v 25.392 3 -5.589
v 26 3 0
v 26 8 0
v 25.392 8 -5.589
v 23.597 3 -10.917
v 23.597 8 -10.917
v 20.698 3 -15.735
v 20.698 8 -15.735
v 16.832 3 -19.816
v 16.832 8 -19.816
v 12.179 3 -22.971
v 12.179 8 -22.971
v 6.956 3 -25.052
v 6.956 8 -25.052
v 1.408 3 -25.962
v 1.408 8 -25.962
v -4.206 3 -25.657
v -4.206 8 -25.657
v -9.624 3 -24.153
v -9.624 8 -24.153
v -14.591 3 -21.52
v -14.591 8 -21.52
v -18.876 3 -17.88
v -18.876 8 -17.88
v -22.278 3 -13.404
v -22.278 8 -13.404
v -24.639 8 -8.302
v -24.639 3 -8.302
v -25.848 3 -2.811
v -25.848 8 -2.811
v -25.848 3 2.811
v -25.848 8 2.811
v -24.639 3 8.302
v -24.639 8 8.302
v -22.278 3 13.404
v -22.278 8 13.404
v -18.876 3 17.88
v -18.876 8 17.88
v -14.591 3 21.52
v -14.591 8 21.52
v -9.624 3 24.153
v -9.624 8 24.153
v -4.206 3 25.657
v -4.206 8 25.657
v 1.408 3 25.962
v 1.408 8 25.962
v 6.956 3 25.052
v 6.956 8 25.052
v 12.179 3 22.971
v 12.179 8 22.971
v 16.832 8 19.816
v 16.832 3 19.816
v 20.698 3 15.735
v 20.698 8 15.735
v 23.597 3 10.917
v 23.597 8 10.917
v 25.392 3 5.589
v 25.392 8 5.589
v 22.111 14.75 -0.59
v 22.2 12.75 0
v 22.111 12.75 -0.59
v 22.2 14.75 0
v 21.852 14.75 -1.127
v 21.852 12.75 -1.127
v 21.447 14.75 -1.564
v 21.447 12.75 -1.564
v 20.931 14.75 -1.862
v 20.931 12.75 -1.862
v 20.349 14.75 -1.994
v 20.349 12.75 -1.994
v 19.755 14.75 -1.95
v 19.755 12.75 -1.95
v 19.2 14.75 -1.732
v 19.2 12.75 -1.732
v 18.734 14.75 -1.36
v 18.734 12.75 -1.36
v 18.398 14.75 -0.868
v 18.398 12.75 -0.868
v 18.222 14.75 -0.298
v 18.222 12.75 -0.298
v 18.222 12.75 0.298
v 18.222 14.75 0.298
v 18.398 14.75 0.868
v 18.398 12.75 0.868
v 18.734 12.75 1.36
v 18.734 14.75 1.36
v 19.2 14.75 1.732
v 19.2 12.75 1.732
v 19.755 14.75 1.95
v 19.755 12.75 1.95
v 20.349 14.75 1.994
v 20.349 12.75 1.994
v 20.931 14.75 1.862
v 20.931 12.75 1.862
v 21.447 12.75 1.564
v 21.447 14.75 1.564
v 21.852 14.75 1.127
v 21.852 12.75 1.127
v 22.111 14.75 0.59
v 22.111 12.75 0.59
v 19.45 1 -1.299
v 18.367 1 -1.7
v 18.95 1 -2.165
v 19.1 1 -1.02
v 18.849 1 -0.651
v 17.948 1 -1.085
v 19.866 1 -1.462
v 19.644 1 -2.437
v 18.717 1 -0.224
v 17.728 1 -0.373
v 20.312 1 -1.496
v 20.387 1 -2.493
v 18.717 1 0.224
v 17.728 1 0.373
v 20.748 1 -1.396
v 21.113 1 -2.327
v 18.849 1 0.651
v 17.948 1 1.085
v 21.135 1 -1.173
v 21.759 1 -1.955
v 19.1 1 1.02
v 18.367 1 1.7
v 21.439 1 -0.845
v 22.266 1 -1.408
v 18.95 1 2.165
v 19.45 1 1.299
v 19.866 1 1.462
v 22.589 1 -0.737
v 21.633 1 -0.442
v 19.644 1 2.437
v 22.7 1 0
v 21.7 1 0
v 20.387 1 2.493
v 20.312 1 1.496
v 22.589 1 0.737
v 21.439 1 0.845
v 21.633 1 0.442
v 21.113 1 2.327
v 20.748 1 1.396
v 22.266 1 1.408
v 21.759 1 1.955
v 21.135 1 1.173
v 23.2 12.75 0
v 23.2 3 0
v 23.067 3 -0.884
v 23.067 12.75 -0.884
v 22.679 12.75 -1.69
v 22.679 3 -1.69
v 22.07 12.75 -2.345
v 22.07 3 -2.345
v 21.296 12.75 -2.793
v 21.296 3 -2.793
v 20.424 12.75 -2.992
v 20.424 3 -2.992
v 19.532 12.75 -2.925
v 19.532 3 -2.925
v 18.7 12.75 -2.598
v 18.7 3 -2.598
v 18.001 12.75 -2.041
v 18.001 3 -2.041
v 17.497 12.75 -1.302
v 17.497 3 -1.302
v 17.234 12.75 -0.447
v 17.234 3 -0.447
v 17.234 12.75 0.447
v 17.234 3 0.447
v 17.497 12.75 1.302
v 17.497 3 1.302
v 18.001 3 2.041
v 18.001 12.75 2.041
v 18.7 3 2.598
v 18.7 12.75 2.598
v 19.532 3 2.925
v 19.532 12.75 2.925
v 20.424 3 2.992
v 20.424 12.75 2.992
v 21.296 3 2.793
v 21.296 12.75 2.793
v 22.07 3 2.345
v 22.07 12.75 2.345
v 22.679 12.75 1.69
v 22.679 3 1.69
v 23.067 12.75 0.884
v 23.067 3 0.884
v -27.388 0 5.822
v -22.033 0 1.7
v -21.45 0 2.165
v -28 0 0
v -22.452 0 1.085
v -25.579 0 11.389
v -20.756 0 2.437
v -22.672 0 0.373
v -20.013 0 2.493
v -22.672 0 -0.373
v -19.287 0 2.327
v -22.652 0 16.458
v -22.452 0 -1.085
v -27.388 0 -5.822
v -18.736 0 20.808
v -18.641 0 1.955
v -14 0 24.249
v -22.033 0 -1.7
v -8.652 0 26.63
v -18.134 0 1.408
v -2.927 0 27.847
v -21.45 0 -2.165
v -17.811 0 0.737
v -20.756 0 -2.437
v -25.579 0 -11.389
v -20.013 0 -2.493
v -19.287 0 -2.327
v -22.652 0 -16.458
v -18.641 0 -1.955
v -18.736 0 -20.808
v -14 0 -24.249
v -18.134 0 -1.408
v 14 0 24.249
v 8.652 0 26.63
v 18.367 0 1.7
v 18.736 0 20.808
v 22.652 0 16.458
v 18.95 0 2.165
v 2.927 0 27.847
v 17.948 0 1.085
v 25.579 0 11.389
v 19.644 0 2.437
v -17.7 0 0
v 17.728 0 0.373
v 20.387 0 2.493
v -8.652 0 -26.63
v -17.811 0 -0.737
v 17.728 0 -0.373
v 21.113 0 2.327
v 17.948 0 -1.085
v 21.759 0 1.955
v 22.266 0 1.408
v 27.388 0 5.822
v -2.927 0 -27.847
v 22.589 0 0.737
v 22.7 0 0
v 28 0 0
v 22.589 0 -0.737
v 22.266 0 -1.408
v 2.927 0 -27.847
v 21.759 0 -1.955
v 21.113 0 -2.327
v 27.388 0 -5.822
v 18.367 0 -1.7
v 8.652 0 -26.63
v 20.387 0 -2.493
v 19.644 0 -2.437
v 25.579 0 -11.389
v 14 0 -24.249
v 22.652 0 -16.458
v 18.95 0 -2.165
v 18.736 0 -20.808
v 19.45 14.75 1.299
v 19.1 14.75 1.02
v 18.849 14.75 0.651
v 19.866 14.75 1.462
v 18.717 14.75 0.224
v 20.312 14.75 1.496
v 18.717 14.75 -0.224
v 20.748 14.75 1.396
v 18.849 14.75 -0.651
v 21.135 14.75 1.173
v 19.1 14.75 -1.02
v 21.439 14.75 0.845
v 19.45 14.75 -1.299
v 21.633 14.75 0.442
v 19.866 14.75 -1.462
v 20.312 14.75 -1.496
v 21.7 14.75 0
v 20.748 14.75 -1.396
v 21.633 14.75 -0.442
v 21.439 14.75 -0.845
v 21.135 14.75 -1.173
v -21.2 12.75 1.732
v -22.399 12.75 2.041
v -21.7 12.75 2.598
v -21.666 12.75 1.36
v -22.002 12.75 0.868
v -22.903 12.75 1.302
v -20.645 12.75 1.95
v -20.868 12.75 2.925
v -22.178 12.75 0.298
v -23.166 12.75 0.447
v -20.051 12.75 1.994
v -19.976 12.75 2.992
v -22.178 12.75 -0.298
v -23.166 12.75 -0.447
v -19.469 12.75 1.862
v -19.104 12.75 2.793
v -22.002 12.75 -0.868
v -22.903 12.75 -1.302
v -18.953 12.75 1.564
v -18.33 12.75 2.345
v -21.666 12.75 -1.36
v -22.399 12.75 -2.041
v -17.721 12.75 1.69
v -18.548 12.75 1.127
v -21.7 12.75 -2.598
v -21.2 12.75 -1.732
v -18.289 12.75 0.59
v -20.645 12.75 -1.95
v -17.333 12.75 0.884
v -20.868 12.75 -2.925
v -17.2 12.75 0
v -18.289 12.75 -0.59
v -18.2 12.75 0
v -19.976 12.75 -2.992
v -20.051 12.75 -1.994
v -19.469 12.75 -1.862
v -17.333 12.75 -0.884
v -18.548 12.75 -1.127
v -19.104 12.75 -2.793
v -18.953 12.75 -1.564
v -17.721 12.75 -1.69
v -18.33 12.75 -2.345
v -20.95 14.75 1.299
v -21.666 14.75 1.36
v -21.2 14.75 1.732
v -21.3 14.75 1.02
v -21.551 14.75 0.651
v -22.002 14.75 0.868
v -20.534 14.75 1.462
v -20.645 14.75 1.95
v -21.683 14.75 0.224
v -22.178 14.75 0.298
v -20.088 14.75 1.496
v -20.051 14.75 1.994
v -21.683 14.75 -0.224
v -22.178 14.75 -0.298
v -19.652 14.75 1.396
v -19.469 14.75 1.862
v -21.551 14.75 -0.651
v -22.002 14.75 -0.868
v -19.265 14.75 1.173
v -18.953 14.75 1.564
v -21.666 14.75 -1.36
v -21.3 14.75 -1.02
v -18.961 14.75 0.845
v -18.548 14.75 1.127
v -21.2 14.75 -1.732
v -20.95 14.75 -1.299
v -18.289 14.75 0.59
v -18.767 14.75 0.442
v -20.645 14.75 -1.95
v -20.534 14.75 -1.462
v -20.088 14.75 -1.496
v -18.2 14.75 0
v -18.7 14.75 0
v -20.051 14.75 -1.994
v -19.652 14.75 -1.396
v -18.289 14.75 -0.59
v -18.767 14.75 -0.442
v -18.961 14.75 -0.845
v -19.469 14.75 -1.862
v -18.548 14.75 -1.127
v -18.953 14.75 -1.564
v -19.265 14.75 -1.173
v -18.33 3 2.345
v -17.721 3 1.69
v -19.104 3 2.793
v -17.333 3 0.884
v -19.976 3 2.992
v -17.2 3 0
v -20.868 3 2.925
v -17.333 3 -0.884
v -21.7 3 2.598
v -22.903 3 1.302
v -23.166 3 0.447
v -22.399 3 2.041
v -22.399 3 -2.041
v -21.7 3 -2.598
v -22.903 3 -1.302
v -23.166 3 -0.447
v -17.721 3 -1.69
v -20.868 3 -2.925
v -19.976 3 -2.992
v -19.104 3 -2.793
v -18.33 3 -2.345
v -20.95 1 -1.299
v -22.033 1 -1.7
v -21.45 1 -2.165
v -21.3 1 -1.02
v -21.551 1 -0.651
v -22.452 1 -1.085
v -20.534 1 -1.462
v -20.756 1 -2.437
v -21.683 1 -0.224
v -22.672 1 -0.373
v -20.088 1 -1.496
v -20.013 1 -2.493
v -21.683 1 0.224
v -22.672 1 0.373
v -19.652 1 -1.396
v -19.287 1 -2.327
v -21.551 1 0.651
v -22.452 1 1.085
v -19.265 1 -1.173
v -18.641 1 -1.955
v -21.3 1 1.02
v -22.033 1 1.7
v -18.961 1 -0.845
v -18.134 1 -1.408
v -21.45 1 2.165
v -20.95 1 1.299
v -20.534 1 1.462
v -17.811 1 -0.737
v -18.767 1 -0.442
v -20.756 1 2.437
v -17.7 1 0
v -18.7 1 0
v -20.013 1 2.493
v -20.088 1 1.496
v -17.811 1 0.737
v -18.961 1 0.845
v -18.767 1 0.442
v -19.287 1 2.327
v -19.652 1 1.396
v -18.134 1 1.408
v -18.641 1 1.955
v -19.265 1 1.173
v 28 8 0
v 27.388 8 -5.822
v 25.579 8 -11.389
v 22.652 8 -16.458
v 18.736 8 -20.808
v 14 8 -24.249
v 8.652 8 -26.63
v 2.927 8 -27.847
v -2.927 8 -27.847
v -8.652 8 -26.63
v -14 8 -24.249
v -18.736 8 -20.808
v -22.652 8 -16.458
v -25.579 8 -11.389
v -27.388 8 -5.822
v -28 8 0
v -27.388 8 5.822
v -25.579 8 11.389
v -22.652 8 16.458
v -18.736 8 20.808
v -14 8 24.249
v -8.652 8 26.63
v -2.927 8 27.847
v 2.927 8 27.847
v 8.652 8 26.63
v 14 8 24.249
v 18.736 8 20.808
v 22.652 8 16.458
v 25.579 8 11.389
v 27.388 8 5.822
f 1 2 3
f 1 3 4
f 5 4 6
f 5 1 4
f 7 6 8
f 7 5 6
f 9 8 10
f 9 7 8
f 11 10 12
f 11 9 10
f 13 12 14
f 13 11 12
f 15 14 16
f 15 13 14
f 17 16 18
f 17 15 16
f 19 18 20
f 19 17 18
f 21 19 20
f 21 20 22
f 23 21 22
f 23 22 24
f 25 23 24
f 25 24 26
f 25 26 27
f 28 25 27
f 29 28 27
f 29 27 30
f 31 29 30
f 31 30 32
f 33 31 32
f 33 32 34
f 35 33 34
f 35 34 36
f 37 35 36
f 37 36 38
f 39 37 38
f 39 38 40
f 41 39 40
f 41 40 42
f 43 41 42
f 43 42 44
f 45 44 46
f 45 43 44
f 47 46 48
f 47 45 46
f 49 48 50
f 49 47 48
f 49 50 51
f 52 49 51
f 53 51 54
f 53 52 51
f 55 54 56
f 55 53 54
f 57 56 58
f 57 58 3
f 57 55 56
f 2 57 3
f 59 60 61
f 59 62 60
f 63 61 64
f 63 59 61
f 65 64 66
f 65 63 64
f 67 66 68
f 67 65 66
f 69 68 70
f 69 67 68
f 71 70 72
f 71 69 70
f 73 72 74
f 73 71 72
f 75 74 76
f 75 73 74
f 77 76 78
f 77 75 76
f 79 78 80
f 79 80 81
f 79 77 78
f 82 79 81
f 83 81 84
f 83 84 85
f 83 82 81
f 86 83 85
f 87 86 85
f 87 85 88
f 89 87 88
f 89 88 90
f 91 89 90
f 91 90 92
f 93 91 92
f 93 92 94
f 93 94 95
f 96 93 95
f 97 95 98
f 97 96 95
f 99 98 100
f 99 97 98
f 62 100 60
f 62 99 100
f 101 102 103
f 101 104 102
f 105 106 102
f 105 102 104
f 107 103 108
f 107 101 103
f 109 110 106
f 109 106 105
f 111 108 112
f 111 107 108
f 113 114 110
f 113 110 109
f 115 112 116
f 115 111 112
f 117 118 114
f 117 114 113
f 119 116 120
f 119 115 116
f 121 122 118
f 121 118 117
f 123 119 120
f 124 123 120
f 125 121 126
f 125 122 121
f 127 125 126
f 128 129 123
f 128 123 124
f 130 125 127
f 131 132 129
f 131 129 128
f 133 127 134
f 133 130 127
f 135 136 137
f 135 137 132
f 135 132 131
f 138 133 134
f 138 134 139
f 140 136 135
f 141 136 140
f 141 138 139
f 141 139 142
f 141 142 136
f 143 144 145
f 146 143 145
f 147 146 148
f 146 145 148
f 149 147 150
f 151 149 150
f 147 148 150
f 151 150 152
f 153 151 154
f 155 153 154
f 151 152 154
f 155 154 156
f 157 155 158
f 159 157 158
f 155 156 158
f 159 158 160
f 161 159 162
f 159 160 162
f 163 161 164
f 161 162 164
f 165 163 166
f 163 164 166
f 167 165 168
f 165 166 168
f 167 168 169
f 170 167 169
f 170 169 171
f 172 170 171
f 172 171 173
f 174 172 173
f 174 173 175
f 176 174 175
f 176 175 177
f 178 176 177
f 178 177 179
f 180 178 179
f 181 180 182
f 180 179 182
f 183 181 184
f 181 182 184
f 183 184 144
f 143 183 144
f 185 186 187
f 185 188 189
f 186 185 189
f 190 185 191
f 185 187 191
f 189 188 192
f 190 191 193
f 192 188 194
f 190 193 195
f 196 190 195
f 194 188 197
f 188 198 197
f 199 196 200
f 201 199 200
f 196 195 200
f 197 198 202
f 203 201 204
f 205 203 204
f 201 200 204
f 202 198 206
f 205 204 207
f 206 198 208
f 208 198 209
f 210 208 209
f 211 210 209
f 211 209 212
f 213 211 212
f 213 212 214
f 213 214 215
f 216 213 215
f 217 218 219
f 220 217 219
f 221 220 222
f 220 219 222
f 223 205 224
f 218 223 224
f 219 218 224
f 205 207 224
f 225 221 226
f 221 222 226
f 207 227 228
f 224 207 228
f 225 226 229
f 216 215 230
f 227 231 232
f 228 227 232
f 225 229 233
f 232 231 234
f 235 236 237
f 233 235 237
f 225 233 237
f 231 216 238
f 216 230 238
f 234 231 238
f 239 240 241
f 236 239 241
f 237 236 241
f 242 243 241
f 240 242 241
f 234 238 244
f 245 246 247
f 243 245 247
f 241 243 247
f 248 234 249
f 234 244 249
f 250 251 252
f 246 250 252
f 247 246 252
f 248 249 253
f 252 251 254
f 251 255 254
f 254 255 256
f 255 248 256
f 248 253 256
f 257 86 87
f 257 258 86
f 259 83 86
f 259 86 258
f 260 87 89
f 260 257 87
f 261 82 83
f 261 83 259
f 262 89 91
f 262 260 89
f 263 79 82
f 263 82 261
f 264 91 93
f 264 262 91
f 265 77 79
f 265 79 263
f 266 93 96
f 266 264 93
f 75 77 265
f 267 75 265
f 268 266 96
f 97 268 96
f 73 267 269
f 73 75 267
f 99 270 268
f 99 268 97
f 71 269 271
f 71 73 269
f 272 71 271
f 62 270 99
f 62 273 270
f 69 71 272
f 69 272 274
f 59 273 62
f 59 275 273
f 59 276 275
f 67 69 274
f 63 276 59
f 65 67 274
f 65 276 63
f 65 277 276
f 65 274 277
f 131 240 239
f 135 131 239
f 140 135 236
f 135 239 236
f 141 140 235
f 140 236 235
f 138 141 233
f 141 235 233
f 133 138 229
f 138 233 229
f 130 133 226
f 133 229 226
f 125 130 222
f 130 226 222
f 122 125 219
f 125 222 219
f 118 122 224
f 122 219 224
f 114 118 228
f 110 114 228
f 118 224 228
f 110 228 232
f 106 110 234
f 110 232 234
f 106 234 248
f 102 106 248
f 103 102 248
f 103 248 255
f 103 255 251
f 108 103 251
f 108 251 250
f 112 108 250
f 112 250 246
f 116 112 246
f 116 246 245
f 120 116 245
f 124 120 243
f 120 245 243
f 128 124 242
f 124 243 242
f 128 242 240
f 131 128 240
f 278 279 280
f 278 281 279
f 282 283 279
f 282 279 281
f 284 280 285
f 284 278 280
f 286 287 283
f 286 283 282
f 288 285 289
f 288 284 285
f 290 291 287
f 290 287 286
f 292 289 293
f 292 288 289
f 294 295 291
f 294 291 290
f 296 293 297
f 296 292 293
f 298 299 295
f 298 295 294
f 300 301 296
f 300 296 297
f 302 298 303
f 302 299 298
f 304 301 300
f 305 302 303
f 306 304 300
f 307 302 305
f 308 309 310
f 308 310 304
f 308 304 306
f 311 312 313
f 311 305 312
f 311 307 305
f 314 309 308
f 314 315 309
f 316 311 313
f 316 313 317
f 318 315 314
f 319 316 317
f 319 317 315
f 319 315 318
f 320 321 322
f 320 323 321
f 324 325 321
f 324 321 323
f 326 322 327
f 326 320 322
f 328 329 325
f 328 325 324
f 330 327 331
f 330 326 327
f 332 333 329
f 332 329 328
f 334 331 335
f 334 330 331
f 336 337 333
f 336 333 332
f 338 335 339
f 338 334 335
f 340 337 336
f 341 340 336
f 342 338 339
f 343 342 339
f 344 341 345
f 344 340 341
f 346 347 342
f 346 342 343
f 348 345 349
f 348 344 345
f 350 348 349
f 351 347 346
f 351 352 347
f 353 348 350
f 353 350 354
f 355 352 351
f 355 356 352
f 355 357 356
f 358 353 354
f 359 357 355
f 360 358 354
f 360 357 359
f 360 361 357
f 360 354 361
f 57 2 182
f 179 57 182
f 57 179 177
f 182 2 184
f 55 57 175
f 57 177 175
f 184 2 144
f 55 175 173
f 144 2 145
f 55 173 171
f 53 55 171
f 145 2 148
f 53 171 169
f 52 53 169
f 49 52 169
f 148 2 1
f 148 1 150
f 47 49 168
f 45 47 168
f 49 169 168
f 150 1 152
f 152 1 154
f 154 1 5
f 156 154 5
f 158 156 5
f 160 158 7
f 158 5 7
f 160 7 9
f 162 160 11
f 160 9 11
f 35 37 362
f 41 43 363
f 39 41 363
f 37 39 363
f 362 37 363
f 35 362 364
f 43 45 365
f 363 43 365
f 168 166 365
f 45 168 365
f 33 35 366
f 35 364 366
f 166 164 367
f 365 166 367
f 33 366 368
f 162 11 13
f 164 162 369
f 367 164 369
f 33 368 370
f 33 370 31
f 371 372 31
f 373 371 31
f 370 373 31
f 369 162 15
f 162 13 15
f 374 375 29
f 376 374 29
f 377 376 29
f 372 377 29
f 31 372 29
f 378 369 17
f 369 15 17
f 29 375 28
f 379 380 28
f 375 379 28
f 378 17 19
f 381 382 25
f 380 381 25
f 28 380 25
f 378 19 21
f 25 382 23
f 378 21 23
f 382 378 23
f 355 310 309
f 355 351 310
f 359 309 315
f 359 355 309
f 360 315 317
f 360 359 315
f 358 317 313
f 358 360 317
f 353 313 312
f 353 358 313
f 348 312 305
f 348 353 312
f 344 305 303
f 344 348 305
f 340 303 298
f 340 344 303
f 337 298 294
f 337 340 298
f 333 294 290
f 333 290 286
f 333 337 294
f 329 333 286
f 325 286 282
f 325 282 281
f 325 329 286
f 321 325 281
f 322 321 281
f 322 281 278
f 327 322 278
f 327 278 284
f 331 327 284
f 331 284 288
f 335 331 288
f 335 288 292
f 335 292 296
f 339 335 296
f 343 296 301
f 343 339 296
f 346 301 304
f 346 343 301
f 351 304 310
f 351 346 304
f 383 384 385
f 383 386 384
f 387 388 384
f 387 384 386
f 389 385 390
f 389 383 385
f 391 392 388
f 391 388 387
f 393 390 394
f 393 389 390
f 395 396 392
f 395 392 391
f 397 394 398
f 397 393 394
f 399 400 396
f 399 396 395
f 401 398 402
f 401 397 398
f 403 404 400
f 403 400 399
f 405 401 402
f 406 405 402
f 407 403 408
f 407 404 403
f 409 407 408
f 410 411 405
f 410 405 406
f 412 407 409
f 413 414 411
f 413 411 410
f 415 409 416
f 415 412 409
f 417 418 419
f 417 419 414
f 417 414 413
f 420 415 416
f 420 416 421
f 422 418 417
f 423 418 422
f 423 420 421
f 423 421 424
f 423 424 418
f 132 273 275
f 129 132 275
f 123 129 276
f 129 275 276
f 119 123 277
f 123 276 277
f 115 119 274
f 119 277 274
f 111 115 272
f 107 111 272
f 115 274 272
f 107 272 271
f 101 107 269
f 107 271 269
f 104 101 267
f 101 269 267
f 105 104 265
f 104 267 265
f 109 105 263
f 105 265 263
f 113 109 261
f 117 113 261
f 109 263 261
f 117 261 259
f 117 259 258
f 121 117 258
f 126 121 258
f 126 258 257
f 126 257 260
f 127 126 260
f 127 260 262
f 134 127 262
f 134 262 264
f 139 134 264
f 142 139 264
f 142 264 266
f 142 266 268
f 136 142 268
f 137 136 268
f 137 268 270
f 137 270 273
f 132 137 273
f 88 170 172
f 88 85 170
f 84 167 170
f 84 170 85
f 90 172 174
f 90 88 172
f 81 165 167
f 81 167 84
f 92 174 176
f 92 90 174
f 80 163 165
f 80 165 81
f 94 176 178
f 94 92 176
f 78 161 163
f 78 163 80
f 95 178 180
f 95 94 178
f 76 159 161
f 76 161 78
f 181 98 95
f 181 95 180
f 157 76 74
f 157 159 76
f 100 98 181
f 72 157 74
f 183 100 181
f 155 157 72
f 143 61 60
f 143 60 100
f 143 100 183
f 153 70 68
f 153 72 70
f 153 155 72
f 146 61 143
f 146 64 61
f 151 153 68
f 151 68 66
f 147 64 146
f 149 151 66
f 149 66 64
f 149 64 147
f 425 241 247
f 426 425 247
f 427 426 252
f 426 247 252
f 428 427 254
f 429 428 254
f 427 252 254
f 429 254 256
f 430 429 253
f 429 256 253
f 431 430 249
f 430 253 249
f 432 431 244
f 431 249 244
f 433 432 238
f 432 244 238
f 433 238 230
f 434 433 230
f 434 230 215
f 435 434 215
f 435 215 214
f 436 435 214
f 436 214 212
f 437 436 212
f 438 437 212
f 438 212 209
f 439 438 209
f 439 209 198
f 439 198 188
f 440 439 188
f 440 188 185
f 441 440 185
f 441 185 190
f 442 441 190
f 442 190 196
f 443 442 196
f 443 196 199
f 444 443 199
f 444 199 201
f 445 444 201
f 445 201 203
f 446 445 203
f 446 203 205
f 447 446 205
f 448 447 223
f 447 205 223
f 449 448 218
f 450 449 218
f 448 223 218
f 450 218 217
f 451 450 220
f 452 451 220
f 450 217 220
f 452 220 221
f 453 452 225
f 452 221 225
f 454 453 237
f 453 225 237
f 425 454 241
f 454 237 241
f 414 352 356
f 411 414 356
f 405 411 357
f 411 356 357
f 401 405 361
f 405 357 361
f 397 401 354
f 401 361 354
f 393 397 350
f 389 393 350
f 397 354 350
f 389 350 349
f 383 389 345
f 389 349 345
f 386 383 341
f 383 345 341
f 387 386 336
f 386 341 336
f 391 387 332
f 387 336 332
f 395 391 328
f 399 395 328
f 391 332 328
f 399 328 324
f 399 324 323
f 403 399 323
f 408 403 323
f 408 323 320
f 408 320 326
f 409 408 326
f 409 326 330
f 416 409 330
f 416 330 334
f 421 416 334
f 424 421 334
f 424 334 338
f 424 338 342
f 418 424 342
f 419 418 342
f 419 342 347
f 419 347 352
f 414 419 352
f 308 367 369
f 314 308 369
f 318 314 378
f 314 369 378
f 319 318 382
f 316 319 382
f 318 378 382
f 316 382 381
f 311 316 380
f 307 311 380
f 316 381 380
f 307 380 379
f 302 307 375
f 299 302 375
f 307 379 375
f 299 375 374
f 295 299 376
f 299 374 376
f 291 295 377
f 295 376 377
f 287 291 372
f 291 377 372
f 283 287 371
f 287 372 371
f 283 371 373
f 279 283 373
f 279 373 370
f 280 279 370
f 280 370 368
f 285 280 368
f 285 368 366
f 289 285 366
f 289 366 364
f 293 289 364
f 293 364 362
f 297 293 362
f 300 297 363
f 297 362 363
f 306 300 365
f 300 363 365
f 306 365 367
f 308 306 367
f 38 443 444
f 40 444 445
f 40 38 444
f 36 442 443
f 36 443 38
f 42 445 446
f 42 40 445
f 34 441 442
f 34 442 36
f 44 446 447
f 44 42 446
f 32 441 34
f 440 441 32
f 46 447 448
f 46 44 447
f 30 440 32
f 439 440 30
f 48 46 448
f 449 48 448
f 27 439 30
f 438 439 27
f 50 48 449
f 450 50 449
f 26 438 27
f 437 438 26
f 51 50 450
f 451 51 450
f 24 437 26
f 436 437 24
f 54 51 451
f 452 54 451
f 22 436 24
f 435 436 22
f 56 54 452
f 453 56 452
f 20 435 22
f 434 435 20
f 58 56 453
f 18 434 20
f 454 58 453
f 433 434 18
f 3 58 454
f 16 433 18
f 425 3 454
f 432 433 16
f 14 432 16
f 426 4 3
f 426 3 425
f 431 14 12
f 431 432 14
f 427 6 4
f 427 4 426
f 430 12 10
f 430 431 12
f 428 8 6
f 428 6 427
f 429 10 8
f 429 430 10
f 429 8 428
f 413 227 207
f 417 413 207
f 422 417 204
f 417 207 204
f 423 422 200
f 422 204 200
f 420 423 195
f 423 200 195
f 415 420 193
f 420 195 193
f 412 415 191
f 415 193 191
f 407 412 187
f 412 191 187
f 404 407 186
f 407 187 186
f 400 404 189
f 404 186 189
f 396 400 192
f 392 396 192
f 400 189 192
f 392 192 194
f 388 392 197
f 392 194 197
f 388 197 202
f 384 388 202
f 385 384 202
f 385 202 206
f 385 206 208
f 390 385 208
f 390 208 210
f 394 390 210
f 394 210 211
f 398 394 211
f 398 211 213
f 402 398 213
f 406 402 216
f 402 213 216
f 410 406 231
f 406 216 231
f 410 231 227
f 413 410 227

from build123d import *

# Parameters (mm, degrees)
SKETCH1_R                  = 28
SKETCH1_R_2                = 26
BOSS_EXTRUDE1_DEPTH        = 8
SKETCH3_R                  = 24
BOSS_EXTRUDE2_DEPTH        = 3
SKETCH5_R                  = 2
BOSS_EXTRUDE3_DEPTH        = 11.75
BOSS_EXTRUDE3_DEPTH_BACK   = 2.5
BOSS_EXTRUDE3_2_DEPTH      = 11.75
BOSS_EXTRUDE3_2_DEPTH_BACK = 2.5
SKETCH10_R                 = 28
BOSS_EXTRUDE4_DEPTH        = 3
SKETCH16_R                 = 3
BOSS_EXTRUDE5_DEPTH        = 9.75
SKETCH20_R                 = 1.5
CUT_EXTRUDE2_DEPTH         = 30
SKETCH21_R                 = 2.5
CUT_EXTRUDE3_DEPTH         = 1


with BuildPart() as part:
    # Sketch1 → Boss-Extrude1 (new body)
    with BuildSketch(Plane(origin=(0, 0, 0), x_dir=(1, 0, 0), z_dir=(0, 1, 0))):
        Circle(SKETCH1_R)
        Circle(SKETCH1_R_2, mode=Mode.SUBTRACT)
    extrude(amount=BOSS_EXTRUDE1_DEPTH)



with BuildPart() as body_2:
    # Sketch3 → Boss-Extrude2 (new body)
    with BuildSketch(Plane(origin=(0, 0, 0), x_dir=(1, 0, 0), z_dir=(0, 1, 0))):
        Circle(SKETCH3_R)
    extrude(amount=BOSS_EXTRUDE2_DEPTH)


with BuildPart() as body_3:
    # Sketch5 → Boss-Extrude3 (new body, two sides)
    with BuildSketch(Plane(origin=(0, 3, 0), x_dir=(1, 0, 0), z_dir=(0, 1, 0))) as boss_extrude3_sk:
        with Locations((-20.2, 0)):
            Circle(SKETCH5_R)
    extrude(amount=BOSS_EXTRUDE3_DEPTH)
    extrude(boss_extrude3_sk.sketch, amount=-BOSS_EXTRUDE3_DEPTH_BACK)


with BuildPart() as body_4:
    # Sketch5 → Boss-Extrude3 2 (new body, two sides)
    with BuildSketch(Plane(origin=(0, 3, 0), x_dir=(1, 0, 0), z_dir=(0, 1, 0))) as boss_extrude3_2_sk:
        with Locations((20.2, 0)):
            Circle(SKETCH5_R)
    extrude(amount=BOSS_EXTRUDE3_2_DEPTH)
    extrude(boss_extrude3_2_sk.sketch, amount=-BOSS_EXTRUDE3_2_DEPTH_BACK)


with BuildPart() as part_1:
    add(part.part)

    add(body_2.part)  # Boss-Extrude4 merges body 2

    add(body_3.part)  # Boss-Extrude4 merges body 3

    add(body_4.part)  # Boss-Extrude4 merges body 4
    # Sketch10 → Boss-Extrude4 (add)
    with BuildSketch(Plane(origin=(0, 0, 0), x_dir=(-1, 0, 0), z_dir=(0, -1, 0))):
        Circle(SKETCH10_R)
    extrude(amount=-BOSS_EXTRUDE4_DEPTH)

    # Sketch16 → Boss-Extrude5 (add)
    with BuildSketch(Plane(origin=(0, 3, 0), x_dir=(1, 0, 0), z_dir=(0, 1, 0))):
        with Locations((20.2, 0)):
            Circle(SKETCH16_R)
        with Locations((-20.2, 0)):
            Circle(SKETCH16_R)
    extrude(amount=BOSS_EXTRUDE5_DEPTH)

    # Sketch20 → Cut-Extrude2 (cut)
    with BuildSketch(Plane(origin=(0, 14.75, 0), x_dir=(1, 0, 0), z_dir=(0, 1, 0))):
        with Locations((20.2, 0)):
            Circle(SKETCH20_R)
        with Locations((-20.2, 0)):
            Circle(SKETCH20_R)
    extrude(amount=-CUT_EXTRUDE2_DEPTH, mode=Mode.SUBTRACT)

    # Sketch21 → Cut-Extrude3 (cut)
    with BuildSketch(Plane.XZ):
        with Locations((20.2, 0)):
            Circle(SKETCH21_R)
        with Locations((-20.2, 0)):
            Circle(SKETCH21_R)
    extrude(amount=-CUT_EXTRUDE3_DEPTH, mode=Mode.SUBTRACT)


solid = part_1.part
